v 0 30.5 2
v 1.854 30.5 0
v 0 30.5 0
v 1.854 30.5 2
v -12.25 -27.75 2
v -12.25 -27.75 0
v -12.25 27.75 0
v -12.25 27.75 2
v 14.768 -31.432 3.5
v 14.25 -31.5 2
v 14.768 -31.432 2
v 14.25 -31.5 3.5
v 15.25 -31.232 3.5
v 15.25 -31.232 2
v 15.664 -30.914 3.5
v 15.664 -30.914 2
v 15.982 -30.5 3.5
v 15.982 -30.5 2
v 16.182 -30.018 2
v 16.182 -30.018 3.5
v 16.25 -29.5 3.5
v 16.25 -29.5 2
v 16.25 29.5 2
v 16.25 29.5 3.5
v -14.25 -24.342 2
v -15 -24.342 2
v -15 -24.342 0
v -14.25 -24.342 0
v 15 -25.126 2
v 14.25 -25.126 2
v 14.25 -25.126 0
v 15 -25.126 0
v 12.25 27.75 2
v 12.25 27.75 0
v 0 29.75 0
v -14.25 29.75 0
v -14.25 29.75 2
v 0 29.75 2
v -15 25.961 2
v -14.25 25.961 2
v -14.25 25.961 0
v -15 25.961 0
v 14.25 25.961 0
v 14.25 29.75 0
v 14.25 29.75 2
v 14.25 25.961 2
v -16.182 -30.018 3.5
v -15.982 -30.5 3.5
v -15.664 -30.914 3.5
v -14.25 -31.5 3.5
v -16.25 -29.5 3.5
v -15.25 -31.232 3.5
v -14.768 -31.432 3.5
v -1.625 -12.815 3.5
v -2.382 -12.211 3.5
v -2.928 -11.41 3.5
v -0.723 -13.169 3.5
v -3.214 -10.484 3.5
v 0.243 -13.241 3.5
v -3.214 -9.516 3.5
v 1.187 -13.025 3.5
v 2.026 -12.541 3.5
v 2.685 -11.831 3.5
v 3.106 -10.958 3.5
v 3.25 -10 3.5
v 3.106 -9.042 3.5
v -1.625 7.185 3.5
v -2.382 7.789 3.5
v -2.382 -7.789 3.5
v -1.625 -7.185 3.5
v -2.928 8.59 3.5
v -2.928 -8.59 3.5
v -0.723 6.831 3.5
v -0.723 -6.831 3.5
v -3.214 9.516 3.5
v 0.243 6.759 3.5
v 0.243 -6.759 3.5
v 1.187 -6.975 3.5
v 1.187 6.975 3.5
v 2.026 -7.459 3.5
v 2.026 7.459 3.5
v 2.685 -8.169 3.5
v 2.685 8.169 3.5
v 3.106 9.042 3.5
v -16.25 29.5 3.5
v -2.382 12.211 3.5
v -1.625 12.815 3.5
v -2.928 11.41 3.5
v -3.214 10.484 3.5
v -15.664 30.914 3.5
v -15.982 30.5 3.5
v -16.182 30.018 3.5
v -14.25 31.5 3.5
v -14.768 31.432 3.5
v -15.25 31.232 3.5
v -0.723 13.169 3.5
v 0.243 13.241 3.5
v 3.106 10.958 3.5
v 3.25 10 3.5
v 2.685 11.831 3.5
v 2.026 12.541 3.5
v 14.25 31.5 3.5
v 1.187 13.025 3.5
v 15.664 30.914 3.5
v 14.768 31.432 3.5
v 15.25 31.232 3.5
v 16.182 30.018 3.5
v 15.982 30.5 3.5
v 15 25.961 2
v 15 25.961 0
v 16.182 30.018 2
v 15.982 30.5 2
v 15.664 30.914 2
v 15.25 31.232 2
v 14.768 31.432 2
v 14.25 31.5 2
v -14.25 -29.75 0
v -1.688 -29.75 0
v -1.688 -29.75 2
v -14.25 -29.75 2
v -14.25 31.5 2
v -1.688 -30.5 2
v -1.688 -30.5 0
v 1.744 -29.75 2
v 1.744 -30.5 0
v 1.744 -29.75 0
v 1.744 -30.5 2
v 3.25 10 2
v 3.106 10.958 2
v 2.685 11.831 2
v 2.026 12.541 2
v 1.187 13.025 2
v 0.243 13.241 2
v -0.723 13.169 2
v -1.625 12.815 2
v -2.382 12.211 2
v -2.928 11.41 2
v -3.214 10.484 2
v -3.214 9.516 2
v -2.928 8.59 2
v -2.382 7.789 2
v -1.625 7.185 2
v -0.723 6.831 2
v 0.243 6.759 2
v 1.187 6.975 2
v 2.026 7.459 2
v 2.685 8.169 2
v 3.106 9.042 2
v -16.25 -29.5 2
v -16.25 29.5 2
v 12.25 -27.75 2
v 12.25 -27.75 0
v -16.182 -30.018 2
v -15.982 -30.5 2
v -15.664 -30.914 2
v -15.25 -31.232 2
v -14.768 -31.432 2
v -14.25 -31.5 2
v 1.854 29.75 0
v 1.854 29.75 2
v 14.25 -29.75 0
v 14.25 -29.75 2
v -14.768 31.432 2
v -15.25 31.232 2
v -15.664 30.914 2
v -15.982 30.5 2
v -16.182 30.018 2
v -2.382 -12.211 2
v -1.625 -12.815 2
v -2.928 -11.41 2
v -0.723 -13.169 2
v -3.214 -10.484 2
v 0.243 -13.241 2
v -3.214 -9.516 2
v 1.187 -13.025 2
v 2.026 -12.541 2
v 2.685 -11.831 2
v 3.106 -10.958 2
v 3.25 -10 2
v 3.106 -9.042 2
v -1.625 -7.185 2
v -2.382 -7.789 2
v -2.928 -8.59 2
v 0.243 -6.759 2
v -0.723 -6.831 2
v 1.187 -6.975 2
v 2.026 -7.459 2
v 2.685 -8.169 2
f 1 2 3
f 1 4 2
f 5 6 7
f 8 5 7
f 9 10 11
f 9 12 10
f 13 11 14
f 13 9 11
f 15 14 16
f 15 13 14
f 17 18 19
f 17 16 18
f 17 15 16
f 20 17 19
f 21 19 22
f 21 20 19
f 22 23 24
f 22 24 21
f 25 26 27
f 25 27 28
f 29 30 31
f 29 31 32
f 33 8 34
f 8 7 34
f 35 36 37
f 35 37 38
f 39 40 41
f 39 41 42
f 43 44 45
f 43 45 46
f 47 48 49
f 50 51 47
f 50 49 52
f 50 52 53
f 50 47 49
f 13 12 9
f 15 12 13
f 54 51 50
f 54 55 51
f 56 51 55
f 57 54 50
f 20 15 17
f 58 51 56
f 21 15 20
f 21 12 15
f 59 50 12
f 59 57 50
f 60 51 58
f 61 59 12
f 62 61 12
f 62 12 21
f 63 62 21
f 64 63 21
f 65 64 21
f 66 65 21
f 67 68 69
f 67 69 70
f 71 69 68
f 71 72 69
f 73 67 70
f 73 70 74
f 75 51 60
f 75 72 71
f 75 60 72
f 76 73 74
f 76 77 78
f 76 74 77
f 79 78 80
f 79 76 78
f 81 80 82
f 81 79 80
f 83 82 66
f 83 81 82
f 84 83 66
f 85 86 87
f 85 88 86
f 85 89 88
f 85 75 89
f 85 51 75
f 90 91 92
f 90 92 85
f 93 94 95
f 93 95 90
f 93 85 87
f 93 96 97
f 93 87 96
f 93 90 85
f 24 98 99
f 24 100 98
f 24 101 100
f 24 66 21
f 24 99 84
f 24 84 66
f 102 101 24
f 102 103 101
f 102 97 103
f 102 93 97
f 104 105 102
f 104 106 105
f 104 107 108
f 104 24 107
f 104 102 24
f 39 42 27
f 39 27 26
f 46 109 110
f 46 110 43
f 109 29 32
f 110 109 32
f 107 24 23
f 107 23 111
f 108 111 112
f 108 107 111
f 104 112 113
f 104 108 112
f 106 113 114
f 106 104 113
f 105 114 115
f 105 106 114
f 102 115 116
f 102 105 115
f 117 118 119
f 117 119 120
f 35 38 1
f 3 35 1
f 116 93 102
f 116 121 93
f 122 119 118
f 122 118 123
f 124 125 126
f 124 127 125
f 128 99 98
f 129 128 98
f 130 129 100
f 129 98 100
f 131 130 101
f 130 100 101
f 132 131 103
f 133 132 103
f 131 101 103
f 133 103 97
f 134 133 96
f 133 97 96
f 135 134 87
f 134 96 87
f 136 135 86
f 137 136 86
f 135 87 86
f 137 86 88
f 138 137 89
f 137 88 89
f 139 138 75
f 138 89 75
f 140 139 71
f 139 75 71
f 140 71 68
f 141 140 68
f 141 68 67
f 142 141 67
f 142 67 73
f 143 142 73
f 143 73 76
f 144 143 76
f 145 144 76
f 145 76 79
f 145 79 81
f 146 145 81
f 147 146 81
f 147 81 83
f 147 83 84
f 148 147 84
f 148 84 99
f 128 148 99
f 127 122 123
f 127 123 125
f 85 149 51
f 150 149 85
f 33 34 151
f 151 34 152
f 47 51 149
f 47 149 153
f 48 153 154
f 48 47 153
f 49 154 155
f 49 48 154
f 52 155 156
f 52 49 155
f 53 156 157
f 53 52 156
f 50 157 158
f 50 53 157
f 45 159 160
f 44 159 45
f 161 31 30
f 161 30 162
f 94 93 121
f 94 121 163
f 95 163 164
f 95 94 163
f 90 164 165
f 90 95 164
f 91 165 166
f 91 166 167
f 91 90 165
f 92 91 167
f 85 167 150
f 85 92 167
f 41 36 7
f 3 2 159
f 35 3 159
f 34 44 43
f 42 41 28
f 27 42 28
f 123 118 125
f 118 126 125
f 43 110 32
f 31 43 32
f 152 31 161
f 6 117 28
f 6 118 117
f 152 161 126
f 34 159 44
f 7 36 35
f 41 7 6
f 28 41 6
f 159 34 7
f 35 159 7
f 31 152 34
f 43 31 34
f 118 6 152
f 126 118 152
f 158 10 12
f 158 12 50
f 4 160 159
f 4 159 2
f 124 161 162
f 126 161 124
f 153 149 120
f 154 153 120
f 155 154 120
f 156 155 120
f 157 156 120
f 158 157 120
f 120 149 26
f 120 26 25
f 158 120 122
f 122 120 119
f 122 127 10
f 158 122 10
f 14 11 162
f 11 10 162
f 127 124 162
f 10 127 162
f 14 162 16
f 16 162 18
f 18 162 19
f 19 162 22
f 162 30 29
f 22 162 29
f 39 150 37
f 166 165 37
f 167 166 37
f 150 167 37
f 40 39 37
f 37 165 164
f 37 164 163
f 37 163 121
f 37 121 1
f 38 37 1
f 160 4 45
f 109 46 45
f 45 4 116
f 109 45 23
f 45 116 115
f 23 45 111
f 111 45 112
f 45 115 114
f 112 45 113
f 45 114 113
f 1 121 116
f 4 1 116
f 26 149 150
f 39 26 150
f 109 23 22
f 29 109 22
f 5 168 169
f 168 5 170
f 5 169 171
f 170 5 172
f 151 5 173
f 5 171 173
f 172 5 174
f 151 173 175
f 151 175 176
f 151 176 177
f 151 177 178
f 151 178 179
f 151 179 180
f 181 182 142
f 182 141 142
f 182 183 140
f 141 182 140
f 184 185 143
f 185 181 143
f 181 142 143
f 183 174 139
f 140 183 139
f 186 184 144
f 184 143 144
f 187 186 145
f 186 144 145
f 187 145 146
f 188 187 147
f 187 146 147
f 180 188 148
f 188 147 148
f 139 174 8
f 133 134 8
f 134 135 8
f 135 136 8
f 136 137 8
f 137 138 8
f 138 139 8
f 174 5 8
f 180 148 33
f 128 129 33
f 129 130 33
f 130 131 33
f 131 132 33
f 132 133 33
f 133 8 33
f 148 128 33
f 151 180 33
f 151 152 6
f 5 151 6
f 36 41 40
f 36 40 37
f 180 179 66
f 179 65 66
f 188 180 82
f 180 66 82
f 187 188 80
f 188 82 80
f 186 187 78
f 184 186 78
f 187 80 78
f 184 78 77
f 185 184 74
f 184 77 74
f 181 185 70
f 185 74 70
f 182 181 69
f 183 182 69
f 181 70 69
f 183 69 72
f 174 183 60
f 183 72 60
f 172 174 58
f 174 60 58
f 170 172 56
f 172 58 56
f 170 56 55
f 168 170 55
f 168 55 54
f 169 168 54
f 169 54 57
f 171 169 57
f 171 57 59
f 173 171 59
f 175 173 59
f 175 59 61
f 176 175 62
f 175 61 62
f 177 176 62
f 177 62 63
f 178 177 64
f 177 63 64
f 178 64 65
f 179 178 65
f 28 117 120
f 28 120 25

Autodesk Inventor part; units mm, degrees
ref_plane "YZ Plane" through (0, 0, 0) normal (1, 0, 0) x (0, 1, 0)
ref_plane "XZ Plane" through (0, 0, 0) normal (0, 1, 0) x (-1, 0, 0)
ref_plane "XY Plane" through (0, 0, 0) normal (0, 0, 1) x (1, 0, 0)
sketch "Эскиз1" plane through (0, 0, 0) normal (0, 0, 1) x (1, 0, 0)
  line L0 (-14.25, 29.75) -> (14.25, 29.75)
  line L1 (14.25, 29.75) -> (14.25, -29.75)
  line L2 (14.25, -29.75) -> (-14.25, -29.75)
  line L3 (-14.25, -29.75) -> (-14.25, 29.75)
  line L4 (0, -41.65) -> (0, 41.65) projected
  line L5 (-19.95, 0) -> (19.95, 0) projected
  line L6 (-12.25, 27.75) -> (12.25, 27.75)
  line L7 (12.25, 27.75) -> (12.25, -27.75)
  line L8 (12.25, -27.75) -> (-12.25, -27.75)
  line L9 (-12.25, -27.75) -> (-12.25, 27.75)
  point P0 (0, 0)
  dimension "d0" = 28.5
  dimension "d1" = 59.5
  dimension "d2" = 2
extrude "Выдавливание1" add sketch "Эскиз1" along normal blind 2 contours L0 L4 L6 L9 L5 L3 | L0 L1 L5 L7 L6 L4 | L5 L9 L8 L4 L2 L3 | L1 L2 L4 L8 L7 L5
sketch "Эскиз2" plane through (0, 0, 2) normal (0, 0, 1) x (1, 0, 0)
  line L0 (-16.25, 31.5) -> (16.25, 31.5)
  line L1 (16.25, 31.5) -> (16.25, -31.5)
  line L2 (16.25, -31.5) -> (-16.25, -31.5)
  line L3 (-16.25, -31.5) -> (-16.25, 31.5)
  line L4 (0, -44.1) -> (0, 44.1) projected
  line L5 (-22.75, 0) -> (22.75, 0) projected
  point P0 (0, 0)
  dimension "d5" = 63
  dimension "d6" = 32.5
extrude "Выдавливание2" add sketch "Эскиз2" along normal blind 1.5
sketch "Эскиз3" plane through (0, 0, 2) normal (0, 0, -1) x (-1, 0, 0)
  line L0 (15, -30.5) -> (-15, -30.5)
  line L1 (-15, -30.5) -> (-15, 30.5)
  line L2 (-15, 30.5) -> (15, 30.5)
  line L3 (15, 30.5) -> (15, -30.5)
  line L4 (0, -44.1) -> (0, 44.1) projected
  line L5 (22.75, 0) -> (-22.75, 0) projected
  line L6 (14.25, -29.75) -> (-14.25, -29.75) projected
  line L7 (1.6881, -30.5) -> (-1.7436, -30.5)
  line L8 (-1.7436, -30.5) -> (-1.7436, -29.75)
  line L9 (-1.7436, -29.75) -> (1.6881, -29.75)
  line L10 (1.6881, -29.75) -> (1.6881, -30.5)
  line L11 (1.6881, 29.75) -> (-1.8544, 29.75)
  line L12 (-1.8544, 29.75) -> (-1.8544, 30.5)
  line L13 (-1.8544, 30.5) -> (1.6881, 30.5)
  line L14 (1.6881, 30.5) -> (1.6881, 29.75)
  line L15 (14.25, 29.75) -> (14.25, -29.75) projected
  line L16 (15, 22.8864) -> (14.25, 22.8864)
  line L17 (14.25, 22.8864) -> (14.25, 25.9613)
  line L18 (14.25, 25.9613) -> (15, 25.9613)
  line L19 (15, 25.9613) -> (15, 22.8864)
  line L20 (15, -24.3425) -> (14.25, -24.3425)
  line L21 (14.25, -24.3425) -> (14.25, -20.2031)
  line L22 (14.25, -20.2031) -> (15, -20.2031)
  line L23 (15, -20.2031) -> (15, -24.3425)
  line L24 (-14.2166, -25.1255) -> (-15, -25.1255)
  line L25 (-15, -25.1255) -> (-15, -18.943)
  line L26 (-15, -18.943) -> (-14.2166, -18.943)
  line L27 (-14.2166, -18.943) -> (-14.2166, -25.1255)
  line L28 (-14.2166, 21.6162) -> (-15, 21.6162)
  line L29 (-15, 21.6162) -> (-15, 25.9613)
  line L30 (-15, 25.9613) -> (-14.2166, 25.9613)
  line L31 (-14.2166, 25.9613) -> (-14.2166, 21.6162)
  point P0 (0, 0)
  point P1 (0, 29.75)
  point P2 (0, 30.5)
  point P3 (1.6881, -29.75)
  dimension "d9" = 61
  dimension "d10" = 30
extrude "Выдавливание3" add sketch "Эскиз3" along normal blind 2 contours L0 L4 L6 L10 | L20 L15 L22 L3 | L0 L8 L6 L4 | L16 L15 L18 L3 | L1 L26 L27 L24 | L11 L12 L2 L4 | L1 L30 L31 L28
sketch "Эскиз4" plane through (0, 0, 3.5) normal (0, 0, 1) x (1, 0, 0)
  circle A0 centre (0, -10) radius 3.25
  circle A1 centre (0, 10) radius 3.25
  line L0 (-22.75, 0) -> (22.75, 0) projected
  point P0 (0, 0)
  dimension "d13" = 6.5
  dimension "d14" = 6.5
  dimension "d15" = 20
extrude "Выдавливание4" cut sketch "Эскиз4" against normal blind 2
fillet "Сопряжение1" radius 2 4 edges at (-16.25, 31.5, 2.75) (16.25, 31.5, 2.75) (16.25, -31.5, 2.75) (-16.25, -31.5, 2.75)
sketch "Эскиз6" plane through (14.25, -18.943, 0) normal (1, 0, 0) x (0, 0, -1)
  line L0 (0, 40.5592) -> (-2, 40.5592) projected
  line L1 (-2, 0) -> (-2, 40.5592) projected
  line L2 (-2, 0) -> (0, 0) projected
  line L3 (0, 0) -> (0, 40.5592) projected
  point P0 (0, 18.943)
extrude "Выдавливание6" add sketch "Эскиз6" along normal up to surface (0.75 mm away)
sketch "Эскиз7" plane through (-14.25, -20.2031, 0) normal (-1, 0, 0) x (0, 0, 1)
  line L0 (0, 0) -> (2, 0) projected
  line L1 (2, 43.0894) -> (2, 0) projected
  line L2 (2, 43.0894) -> (0, 43.0894) projected
  line L3 (0, 43.0894) -> (0, 0) projected
  point P0 (0, 20.2031)
extrude "Выдавливание7" add sketch "Эскиз7" along normal up to surface (0.75 mm away)
properties part number "нижняя часть блока аккумов"
